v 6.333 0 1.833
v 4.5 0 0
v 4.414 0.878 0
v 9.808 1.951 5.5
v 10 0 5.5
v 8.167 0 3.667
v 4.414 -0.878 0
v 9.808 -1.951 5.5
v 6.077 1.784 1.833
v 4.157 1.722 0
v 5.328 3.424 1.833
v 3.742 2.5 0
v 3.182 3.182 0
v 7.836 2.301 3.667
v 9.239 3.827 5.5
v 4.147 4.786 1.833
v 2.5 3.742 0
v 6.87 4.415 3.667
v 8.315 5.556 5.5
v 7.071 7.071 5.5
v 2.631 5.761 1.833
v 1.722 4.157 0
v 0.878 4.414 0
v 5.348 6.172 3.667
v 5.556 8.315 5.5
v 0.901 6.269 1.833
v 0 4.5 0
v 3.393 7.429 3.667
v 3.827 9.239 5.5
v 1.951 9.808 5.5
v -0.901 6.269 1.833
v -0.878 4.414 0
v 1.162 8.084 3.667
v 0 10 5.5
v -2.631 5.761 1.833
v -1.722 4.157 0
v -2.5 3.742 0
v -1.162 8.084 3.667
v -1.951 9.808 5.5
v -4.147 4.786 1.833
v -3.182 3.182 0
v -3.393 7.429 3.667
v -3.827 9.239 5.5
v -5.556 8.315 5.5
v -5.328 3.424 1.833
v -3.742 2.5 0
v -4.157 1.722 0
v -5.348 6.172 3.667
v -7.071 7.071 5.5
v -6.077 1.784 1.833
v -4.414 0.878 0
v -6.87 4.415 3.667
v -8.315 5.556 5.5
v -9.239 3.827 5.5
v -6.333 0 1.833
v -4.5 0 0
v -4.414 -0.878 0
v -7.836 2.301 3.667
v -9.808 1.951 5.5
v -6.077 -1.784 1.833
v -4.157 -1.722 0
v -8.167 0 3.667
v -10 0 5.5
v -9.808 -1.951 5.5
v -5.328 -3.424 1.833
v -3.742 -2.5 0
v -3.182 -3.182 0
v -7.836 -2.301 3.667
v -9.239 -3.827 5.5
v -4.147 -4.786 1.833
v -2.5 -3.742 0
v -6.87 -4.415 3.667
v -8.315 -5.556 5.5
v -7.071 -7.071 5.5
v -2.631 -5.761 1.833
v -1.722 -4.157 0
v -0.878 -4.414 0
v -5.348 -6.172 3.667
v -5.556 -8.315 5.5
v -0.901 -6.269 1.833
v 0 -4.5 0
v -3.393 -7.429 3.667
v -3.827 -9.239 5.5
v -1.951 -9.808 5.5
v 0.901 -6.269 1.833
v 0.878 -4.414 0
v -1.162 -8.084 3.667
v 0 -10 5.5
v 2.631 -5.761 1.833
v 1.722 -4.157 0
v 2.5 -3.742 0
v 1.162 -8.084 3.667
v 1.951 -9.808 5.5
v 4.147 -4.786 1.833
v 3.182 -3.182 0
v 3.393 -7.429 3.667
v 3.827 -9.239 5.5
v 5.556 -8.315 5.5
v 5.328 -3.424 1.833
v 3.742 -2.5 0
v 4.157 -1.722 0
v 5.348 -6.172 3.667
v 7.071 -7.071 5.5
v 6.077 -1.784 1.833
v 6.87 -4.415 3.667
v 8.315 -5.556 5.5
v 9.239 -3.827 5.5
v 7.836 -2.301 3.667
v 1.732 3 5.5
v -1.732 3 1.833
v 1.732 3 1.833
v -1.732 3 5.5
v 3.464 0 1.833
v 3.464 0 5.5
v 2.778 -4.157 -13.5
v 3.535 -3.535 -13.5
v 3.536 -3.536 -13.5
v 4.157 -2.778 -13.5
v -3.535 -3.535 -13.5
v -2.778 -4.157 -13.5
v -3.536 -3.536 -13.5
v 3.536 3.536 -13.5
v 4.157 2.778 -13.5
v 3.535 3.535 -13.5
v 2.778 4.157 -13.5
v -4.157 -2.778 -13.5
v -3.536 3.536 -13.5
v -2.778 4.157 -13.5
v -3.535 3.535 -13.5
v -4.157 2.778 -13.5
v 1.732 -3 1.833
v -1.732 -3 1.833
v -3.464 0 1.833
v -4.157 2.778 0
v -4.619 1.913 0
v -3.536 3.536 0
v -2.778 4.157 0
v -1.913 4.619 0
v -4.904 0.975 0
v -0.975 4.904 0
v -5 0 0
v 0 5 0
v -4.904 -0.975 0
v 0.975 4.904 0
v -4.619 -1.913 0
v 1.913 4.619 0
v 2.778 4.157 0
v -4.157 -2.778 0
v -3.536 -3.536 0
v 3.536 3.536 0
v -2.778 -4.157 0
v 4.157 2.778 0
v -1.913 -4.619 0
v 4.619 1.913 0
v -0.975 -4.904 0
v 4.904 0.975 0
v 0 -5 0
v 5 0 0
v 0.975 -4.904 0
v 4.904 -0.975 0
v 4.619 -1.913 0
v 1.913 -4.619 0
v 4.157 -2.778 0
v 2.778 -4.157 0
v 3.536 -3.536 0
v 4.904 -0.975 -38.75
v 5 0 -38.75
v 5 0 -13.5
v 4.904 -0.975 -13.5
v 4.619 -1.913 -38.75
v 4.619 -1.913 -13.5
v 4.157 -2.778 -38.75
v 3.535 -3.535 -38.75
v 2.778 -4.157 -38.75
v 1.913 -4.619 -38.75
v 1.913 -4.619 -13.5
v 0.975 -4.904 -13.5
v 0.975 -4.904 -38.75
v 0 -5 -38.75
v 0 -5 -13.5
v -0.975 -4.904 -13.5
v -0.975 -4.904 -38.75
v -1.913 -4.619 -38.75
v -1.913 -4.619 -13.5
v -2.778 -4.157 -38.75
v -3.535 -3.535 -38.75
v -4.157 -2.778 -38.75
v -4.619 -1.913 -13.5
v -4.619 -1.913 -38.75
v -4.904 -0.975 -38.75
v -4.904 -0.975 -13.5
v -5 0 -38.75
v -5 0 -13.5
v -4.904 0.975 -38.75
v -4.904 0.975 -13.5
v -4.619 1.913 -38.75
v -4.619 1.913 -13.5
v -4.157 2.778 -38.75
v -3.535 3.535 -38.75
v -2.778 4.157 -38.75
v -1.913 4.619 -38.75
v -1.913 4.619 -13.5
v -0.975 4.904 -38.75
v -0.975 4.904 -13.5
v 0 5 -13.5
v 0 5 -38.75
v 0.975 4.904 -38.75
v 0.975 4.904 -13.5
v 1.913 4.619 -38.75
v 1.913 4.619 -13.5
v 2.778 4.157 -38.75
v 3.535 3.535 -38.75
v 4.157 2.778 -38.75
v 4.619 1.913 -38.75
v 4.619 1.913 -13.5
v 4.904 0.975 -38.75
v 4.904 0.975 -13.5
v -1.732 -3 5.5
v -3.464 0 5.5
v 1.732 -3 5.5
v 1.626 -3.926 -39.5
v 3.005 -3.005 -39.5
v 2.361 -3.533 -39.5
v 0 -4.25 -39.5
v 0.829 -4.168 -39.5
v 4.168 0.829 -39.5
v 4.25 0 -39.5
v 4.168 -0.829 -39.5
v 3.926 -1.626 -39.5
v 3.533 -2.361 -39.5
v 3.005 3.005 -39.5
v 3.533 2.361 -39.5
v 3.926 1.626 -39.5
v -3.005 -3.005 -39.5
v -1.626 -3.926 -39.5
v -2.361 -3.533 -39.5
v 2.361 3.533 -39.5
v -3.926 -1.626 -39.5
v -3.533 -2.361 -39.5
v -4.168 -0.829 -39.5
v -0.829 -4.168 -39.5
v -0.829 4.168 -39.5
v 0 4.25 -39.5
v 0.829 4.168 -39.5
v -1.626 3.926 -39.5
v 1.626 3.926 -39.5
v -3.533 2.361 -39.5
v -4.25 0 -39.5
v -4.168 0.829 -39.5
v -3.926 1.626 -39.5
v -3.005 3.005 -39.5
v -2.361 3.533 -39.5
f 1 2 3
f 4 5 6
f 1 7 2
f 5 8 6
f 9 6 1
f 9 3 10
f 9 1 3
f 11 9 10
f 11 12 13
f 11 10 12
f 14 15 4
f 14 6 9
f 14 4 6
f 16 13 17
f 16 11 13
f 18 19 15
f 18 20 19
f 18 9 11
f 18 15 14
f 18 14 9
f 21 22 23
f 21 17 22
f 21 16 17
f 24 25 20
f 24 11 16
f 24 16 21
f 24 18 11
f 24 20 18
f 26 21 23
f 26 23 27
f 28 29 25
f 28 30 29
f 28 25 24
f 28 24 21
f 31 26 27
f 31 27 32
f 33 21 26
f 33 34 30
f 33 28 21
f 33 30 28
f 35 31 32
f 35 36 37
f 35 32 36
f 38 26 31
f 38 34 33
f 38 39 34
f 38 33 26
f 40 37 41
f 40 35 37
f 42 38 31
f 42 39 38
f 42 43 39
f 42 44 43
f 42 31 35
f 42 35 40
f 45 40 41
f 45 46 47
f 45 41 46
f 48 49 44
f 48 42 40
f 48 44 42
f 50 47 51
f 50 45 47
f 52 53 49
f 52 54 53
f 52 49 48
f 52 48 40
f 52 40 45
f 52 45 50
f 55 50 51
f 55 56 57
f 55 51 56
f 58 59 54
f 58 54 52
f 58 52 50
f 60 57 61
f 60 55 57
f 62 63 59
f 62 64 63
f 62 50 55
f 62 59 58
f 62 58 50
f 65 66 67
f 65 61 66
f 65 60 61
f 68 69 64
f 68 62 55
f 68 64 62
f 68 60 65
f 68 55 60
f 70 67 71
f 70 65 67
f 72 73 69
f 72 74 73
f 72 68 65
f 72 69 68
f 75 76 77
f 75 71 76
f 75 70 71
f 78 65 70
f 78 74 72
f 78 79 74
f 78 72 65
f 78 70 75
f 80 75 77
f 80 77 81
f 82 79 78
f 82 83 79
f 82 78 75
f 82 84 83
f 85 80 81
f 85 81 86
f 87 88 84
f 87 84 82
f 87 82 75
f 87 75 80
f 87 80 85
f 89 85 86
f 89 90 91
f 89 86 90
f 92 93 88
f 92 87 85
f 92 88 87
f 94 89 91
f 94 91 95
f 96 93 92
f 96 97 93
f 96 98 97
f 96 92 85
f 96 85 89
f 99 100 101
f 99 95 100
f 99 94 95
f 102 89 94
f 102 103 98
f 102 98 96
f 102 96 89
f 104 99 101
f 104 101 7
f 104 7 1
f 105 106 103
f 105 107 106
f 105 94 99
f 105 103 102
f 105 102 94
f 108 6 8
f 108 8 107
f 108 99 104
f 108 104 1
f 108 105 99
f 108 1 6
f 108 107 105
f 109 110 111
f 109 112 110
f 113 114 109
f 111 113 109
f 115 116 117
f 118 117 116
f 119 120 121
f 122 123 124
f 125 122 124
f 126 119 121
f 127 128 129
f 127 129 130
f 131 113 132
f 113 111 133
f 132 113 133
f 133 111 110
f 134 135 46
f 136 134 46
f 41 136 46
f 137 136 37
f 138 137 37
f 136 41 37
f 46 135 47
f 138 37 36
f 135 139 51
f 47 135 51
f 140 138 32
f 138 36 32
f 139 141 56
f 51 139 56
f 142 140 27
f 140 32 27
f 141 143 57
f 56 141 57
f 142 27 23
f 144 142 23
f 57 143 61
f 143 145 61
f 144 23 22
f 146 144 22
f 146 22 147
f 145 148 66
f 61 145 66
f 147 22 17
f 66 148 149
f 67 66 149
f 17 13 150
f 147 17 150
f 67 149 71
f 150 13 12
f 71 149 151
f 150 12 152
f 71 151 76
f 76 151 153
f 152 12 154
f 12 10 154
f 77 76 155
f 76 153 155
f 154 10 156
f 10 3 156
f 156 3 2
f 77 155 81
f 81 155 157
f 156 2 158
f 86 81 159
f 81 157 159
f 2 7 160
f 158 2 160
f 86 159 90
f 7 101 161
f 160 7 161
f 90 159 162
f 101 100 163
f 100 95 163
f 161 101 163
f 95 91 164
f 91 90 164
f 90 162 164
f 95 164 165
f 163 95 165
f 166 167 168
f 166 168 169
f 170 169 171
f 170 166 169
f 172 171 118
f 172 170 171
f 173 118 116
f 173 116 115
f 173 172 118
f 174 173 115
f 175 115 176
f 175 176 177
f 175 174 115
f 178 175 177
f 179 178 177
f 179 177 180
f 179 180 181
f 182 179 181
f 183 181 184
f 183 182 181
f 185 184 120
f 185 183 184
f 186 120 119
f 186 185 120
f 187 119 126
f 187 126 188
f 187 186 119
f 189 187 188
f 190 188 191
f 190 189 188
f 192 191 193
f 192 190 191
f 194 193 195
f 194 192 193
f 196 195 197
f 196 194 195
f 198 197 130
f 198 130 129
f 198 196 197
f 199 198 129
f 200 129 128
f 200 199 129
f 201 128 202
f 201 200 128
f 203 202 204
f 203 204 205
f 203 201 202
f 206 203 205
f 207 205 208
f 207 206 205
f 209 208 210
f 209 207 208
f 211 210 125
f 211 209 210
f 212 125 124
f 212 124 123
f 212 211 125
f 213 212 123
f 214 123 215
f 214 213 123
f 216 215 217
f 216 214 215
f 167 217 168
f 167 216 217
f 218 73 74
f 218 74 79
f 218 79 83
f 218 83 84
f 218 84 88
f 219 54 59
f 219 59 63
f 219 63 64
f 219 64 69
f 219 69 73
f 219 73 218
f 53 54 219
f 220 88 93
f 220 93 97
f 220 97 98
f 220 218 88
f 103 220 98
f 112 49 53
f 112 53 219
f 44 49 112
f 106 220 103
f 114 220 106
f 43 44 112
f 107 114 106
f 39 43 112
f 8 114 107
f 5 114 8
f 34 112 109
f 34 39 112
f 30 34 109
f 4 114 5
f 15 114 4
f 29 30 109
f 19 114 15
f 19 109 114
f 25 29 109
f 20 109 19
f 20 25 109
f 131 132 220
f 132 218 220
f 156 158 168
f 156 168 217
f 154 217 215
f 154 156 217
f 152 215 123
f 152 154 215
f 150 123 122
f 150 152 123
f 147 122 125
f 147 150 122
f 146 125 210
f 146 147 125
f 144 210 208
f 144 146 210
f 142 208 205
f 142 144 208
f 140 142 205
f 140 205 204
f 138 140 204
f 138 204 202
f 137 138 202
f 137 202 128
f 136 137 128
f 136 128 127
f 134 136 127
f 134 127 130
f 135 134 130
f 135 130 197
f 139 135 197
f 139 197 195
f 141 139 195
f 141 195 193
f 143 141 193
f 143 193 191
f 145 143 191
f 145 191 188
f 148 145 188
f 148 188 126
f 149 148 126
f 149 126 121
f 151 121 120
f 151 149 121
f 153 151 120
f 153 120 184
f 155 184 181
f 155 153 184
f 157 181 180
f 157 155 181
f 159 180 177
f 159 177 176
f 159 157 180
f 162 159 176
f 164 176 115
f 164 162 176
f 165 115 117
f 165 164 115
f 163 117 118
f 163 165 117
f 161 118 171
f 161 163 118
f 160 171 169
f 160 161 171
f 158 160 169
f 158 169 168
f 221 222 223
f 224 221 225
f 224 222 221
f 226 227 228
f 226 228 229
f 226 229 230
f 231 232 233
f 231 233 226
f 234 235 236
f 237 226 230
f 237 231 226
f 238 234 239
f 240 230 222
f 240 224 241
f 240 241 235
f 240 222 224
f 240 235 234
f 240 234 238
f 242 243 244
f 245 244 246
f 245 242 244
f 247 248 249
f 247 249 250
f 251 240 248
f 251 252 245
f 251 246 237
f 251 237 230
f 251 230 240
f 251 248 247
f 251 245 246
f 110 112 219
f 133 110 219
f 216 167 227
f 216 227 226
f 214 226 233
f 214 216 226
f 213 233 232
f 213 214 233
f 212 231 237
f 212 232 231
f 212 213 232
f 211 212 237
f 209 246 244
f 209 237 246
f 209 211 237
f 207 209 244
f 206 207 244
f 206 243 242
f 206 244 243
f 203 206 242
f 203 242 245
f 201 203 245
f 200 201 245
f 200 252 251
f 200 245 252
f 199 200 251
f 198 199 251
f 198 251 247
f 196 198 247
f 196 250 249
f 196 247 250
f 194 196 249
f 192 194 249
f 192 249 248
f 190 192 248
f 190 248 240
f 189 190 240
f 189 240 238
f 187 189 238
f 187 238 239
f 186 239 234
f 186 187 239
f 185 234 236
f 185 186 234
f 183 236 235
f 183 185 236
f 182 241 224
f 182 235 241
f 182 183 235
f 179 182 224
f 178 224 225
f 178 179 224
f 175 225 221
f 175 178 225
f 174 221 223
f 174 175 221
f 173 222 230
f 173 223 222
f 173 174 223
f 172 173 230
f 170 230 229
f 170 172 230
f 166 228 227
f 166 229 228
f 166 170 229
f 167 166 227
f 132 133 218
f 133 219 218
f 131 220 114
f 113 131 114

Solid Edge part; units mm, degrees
sketch "Sketch1" plane through (0, 0, 0) normal (0, 0, 1) x (1, 0, 0)
  circle A0 centre (0, 0) radius 10
  dimension "D1" = 20
extrude "Protrusion1" add sketch "Sketch1" along normal blind 5.5
sketch "Sketch2" plane through (0, 0, 0) normal (0, 0, -1) x (1, 0, 0)
  circle A0 centre (0, 0) radius 5
extrude "Protrusion2" add sketch "Sketch2" along normal blind 39.5
sketch "Sketch3" plane through (0, 0, -39.5) normal (0, 0, -1) x (1, 0, 0)
  circle A0 centre (0, 0) radius 4.9997
extrude "Cutout1" cut sketch "Sketch3" against normal blind 26 flip side to cut
chamfer "Chamfer_1" distance 0.75 angle 45 1 edges at (-4.9997, 0, -39.5)
sketch "Sketch4" plane through (0, 0, 5.5) normal (0, 0, 1) x (1, 0, 0)
  line L0 (-1.7321, 3) -> (1.7321, 3)
  line L1 (3.4641, 0) -> (1.7321, 3)
  line L2 (1.7321, -3) -> (3.4641, 0)
  line L3 (-1.7321, -3) -> (1.7321, -3)
  line L4 (-3.4641, 0) -> (-1.7321, -3)
  line L5 (-1.7321, 3) -> (-3.4641, 0)
  dimension "D1" = 6
extrude "Cutout2" cut sketch "Sketch4" against normal blind 3.6667
sketch "Sketch5" plane through (0, 0, 0) normal (0, -1, 0) x (1, 0, 0)
  line L0 (10, 5.5) -> (4.5, 0)
  line L1 (4.5, 0) -> (10, 0)
  line L2 (10, 0) -> (10, 5.5)
revolve "RevolvedCutout1" cut sketch "Sketch5" angle 360 about axis through (0, 0, 14.0017) along (0, 0, -1)
properties part number "185740" material "Stainless Steel, 304"
